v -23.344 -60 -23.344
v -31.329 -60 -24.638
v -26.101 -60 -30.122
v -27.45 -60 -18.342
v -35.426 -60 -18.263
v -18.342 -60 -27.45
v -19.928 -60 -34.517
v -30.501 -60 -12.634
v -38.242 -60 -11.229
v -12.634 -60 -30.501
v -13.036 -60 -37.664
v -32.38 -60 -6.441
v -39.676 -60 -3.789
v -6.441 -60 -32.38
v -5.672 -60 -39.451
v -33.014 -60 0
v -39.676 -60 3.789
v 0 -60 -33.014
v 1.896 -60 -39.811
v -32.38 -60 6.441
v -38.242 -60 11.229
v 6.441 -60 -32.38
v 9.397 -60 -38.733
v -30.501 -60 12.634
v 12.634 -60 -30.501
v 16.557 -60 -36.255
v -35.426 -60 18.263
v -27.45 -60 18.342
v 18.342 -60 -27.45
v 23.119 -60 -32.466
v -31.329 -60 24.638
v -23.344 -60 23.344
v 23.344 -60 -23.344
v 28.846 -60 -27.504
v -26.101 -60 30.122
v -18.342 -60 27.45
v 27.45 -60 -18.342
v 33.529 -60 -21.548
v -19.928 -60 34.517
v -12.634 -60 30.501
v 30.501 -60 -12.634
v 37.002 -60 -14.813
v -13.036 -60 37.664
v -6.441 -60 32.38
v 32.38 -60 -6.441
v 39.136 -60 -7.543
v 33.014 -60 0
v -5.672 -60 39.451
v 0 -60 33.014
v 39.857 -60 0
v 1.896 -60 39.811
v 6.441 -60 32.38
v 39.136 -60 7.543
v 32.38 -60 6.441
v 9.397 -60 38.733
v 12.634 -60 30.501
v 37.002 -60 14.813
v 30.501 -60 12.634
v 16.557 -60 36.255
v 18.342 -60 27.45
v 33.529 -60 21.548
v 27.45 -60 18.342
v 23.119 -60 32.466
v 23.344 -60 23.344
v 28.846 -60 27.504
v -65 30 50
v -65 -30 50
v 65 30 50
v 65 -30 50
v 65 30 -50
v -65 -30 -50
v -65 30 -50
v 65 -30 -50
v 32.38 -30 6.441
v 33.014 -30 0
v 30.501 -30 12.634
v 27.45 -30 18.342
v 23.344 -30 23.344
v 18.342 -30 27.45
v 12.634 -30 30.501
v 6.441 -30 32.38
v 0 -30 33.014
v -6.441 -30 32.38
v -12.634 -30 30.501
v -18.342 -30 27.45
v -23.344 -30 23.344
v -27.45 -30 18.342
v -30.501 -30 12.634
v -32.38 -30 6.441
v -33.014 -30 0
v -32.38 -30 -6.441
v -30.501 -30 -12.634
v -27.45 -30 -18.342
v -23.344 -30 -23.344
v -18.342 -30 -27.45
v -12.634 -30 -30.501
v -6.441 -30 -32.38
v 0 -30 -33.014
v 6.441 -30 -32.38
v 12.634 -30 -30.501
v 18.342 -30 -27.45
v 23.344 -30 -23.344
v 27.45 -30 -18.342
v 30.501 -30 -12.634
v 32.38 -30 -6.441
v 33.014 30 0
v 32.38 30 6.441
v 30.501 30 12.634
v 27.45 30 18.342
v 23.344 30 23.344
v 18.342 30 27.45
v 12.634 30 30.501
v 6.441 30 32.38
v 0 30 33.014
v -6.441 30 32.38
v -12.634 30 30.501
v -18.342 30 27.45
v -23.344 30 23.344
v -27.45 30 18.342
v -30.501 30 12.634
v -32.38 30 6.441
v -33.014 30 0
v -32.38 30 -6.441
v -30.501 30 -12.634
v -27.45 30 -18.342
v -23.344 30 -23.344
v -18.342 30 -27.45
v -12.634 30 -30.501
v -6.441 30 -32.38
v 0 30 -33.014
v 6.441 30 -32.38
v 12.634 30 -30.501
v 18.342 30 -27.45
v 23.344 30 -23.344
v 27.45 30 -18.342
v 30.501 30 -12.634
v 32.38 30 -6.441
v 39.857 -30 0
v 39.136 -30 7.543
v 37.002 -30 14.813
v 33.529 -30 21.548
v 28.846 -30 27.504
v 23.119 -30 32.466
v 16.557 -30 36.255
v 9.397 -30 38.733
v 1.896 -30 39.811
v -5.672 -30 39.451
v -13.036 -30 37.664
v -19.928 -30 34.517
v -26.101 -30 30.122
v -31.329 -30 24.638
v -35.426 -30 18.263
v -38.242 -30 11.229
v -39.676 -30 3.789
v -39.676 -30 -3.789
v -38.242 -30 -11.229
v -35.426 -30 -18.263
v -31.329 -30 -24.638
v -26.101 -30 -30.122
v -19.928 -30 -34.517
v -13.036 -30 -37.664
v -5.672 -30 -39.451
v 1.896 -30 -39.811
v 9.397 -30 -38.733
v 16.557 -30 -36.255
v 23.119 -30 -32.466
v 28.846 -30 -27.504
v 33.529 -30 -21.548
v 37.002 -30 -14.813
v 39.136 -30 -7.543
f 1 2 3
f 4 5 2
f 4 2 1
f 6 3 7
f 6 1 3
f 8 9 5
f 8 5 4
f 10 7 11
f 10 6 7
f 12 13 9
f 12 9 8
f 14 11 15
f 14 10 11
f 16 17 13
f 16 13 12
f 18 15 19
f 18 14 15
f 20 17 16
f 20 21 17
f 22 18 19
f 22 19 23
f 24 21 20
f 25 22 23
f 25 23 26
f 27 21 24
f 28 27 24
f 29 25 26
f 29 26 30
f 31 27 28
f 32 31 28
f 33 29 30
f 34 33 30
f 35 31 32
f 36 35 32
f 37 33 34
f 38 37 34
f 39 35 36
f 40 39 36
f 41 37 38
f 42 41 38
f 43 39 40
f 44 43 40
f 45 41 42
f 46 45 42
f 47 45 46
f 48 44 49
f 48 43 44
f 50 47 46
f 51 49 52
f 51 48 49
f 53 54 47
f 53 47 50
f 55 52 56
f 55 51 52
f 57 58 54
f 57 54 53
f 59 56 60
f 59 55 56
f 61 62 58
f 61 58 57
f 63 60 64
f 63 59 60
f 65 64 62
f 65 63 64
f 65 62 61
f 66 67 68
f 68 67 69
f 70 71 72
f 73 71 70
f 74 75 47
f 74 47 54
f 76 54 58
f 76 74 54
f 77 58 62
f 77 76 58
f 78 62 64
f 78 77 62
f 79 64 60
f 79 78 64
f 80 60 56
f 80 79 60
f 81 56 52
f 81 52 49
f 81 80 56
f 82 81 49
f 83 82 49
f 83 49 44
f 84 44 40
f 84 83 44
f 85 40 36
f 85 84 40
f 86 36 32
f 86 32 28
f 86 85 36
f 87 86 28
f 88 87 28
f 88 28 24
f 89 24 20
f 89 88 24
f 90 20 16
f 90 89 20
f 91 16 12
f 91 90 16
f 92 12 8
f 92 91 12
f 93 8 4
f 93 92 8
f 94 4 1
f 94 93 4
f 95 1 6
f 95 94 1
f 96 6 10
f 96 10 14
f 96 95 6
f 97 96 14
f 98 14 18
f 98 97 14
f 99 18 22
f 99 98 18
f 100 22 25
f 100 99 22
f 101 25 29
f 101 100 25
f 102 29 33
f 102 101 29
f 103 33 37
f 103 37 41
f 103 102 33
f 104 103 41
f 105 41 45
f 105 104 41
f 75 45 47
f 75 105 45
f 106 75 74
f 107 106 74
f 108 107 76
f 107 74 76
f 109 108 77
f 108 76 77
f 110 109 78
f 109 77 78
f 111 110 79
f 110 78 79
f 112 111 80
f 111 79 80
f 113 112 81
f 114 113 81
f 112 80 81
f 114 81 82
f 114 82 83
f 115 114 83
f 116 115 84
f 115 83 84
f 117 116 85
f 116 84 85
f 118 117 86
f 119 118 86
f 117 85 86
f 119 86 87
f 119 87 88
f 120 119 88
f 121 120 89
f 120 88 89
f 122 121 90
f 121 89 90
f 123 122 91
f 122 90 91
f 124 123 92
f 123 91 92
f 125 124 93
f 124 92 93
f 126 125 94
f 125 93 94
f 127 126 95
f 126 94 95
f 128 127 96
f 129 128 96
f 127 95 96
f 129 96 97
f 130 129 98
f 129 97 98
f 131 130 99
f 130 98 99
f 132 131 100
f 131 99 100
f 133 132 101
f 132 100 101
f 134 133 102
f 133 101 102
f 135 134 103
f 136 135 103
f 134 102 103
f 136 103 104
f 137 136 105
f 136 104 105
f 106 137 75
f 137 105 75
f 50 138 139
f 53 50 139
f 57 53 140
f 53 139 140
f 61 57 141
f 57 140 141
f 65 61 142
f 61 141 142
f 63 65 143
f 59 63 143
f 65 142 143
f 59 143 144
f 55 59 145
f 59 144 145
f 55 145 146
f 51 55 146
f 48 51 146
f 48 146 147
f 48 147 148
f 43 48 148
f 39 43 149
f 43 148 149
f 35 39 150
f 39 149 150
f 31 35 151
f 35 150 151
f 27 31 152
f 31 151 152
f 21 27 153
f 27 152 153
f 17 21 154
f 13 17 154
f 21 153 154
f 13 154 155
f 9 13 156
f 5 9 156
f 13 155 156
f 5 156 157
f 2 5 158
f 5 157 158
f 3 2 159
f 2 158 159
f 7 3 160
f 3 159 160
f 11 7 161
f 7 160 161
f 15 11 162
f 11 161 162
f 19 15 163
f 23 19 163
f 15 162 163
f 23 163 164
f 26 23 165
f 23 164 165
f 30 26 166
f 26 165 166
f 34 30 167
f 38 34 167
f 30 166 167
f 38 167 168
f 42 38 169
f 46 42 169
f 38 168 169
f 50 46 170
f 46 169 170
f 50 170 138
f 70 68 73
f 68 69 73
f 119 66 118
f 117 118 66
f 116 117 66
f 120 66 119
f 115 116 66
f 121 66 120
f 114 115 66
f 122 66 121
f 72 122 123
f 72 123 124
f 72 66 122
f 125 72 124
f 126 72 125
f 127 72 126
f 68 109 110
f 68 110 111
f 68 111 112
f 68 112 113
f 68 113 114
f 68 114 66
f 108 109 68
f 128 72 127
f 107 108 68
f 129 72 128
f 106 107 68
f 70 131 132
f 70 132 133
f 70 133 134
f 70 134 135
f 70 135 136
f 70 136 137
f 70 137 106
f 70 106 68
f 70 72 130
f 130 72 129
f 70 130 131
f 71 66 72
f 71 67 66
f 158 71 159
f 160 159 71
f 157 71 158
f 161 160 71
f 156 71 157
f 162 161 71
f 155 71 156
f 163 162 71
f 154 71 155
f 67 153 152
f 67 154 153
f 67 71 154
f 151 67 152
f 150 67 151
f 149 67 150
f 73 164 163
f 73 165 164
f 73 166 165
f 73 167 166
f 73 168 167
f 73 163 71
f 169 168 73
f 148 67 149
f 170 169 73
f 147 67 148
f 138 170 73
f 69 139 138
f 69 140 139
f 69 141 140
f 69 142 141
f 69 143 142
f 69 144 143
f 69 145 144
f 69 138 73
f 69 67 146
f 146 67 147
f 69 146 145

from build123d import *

# Parameters (mm, degrees)
F0_W      = 130
F0_H      = 100
F1_DEPTH  = 30
F1_FACE_W = 130
F1_FACE_H = 100
F2_DEPTH  = 30
F3_R      = 39.856576
F3_R_2    = 33.013894
F4_DEPTH  = 30
F4_FACE_R = 33.013894
F5_DEPTH  = 60


with BuildPart() as f1:
    # F0 (on Front) → F1 (new body)
    with BuildSketch(Plane.XZ):
        Rectangle(F0_W, F0_H)
    extrude(amount=F1_DEPTH)

    # F1_face (on face) → F2 (join)
    with BuildSketch(Plane(origin=(0, 0, 0), x_dir=(1, 0, 0), z_dir=(0, 1, 0))):
        Rectangle(F1_FACE_W, F1_FACE_H)
    extrude(amount=F2_DEPTH)

    # F3 (on face) → F4 (join)
    with BuildSketch(Plane.XZ.offset(30)):
        Circle(F3_R)
        Circle(F3_R_2, mode=Mode.SUBTRACT)
    extrude(amount=F4_DEPTH)

    # F4_face (on face) → F5 (cut)
    with BuildSketch(Plane.XZ.offset(30)):
        Circle(F4_FACE_R)
    extrude(amount=-F5_DEPTH, mode=Mode.SUBTRACT)


solid = f1.part
